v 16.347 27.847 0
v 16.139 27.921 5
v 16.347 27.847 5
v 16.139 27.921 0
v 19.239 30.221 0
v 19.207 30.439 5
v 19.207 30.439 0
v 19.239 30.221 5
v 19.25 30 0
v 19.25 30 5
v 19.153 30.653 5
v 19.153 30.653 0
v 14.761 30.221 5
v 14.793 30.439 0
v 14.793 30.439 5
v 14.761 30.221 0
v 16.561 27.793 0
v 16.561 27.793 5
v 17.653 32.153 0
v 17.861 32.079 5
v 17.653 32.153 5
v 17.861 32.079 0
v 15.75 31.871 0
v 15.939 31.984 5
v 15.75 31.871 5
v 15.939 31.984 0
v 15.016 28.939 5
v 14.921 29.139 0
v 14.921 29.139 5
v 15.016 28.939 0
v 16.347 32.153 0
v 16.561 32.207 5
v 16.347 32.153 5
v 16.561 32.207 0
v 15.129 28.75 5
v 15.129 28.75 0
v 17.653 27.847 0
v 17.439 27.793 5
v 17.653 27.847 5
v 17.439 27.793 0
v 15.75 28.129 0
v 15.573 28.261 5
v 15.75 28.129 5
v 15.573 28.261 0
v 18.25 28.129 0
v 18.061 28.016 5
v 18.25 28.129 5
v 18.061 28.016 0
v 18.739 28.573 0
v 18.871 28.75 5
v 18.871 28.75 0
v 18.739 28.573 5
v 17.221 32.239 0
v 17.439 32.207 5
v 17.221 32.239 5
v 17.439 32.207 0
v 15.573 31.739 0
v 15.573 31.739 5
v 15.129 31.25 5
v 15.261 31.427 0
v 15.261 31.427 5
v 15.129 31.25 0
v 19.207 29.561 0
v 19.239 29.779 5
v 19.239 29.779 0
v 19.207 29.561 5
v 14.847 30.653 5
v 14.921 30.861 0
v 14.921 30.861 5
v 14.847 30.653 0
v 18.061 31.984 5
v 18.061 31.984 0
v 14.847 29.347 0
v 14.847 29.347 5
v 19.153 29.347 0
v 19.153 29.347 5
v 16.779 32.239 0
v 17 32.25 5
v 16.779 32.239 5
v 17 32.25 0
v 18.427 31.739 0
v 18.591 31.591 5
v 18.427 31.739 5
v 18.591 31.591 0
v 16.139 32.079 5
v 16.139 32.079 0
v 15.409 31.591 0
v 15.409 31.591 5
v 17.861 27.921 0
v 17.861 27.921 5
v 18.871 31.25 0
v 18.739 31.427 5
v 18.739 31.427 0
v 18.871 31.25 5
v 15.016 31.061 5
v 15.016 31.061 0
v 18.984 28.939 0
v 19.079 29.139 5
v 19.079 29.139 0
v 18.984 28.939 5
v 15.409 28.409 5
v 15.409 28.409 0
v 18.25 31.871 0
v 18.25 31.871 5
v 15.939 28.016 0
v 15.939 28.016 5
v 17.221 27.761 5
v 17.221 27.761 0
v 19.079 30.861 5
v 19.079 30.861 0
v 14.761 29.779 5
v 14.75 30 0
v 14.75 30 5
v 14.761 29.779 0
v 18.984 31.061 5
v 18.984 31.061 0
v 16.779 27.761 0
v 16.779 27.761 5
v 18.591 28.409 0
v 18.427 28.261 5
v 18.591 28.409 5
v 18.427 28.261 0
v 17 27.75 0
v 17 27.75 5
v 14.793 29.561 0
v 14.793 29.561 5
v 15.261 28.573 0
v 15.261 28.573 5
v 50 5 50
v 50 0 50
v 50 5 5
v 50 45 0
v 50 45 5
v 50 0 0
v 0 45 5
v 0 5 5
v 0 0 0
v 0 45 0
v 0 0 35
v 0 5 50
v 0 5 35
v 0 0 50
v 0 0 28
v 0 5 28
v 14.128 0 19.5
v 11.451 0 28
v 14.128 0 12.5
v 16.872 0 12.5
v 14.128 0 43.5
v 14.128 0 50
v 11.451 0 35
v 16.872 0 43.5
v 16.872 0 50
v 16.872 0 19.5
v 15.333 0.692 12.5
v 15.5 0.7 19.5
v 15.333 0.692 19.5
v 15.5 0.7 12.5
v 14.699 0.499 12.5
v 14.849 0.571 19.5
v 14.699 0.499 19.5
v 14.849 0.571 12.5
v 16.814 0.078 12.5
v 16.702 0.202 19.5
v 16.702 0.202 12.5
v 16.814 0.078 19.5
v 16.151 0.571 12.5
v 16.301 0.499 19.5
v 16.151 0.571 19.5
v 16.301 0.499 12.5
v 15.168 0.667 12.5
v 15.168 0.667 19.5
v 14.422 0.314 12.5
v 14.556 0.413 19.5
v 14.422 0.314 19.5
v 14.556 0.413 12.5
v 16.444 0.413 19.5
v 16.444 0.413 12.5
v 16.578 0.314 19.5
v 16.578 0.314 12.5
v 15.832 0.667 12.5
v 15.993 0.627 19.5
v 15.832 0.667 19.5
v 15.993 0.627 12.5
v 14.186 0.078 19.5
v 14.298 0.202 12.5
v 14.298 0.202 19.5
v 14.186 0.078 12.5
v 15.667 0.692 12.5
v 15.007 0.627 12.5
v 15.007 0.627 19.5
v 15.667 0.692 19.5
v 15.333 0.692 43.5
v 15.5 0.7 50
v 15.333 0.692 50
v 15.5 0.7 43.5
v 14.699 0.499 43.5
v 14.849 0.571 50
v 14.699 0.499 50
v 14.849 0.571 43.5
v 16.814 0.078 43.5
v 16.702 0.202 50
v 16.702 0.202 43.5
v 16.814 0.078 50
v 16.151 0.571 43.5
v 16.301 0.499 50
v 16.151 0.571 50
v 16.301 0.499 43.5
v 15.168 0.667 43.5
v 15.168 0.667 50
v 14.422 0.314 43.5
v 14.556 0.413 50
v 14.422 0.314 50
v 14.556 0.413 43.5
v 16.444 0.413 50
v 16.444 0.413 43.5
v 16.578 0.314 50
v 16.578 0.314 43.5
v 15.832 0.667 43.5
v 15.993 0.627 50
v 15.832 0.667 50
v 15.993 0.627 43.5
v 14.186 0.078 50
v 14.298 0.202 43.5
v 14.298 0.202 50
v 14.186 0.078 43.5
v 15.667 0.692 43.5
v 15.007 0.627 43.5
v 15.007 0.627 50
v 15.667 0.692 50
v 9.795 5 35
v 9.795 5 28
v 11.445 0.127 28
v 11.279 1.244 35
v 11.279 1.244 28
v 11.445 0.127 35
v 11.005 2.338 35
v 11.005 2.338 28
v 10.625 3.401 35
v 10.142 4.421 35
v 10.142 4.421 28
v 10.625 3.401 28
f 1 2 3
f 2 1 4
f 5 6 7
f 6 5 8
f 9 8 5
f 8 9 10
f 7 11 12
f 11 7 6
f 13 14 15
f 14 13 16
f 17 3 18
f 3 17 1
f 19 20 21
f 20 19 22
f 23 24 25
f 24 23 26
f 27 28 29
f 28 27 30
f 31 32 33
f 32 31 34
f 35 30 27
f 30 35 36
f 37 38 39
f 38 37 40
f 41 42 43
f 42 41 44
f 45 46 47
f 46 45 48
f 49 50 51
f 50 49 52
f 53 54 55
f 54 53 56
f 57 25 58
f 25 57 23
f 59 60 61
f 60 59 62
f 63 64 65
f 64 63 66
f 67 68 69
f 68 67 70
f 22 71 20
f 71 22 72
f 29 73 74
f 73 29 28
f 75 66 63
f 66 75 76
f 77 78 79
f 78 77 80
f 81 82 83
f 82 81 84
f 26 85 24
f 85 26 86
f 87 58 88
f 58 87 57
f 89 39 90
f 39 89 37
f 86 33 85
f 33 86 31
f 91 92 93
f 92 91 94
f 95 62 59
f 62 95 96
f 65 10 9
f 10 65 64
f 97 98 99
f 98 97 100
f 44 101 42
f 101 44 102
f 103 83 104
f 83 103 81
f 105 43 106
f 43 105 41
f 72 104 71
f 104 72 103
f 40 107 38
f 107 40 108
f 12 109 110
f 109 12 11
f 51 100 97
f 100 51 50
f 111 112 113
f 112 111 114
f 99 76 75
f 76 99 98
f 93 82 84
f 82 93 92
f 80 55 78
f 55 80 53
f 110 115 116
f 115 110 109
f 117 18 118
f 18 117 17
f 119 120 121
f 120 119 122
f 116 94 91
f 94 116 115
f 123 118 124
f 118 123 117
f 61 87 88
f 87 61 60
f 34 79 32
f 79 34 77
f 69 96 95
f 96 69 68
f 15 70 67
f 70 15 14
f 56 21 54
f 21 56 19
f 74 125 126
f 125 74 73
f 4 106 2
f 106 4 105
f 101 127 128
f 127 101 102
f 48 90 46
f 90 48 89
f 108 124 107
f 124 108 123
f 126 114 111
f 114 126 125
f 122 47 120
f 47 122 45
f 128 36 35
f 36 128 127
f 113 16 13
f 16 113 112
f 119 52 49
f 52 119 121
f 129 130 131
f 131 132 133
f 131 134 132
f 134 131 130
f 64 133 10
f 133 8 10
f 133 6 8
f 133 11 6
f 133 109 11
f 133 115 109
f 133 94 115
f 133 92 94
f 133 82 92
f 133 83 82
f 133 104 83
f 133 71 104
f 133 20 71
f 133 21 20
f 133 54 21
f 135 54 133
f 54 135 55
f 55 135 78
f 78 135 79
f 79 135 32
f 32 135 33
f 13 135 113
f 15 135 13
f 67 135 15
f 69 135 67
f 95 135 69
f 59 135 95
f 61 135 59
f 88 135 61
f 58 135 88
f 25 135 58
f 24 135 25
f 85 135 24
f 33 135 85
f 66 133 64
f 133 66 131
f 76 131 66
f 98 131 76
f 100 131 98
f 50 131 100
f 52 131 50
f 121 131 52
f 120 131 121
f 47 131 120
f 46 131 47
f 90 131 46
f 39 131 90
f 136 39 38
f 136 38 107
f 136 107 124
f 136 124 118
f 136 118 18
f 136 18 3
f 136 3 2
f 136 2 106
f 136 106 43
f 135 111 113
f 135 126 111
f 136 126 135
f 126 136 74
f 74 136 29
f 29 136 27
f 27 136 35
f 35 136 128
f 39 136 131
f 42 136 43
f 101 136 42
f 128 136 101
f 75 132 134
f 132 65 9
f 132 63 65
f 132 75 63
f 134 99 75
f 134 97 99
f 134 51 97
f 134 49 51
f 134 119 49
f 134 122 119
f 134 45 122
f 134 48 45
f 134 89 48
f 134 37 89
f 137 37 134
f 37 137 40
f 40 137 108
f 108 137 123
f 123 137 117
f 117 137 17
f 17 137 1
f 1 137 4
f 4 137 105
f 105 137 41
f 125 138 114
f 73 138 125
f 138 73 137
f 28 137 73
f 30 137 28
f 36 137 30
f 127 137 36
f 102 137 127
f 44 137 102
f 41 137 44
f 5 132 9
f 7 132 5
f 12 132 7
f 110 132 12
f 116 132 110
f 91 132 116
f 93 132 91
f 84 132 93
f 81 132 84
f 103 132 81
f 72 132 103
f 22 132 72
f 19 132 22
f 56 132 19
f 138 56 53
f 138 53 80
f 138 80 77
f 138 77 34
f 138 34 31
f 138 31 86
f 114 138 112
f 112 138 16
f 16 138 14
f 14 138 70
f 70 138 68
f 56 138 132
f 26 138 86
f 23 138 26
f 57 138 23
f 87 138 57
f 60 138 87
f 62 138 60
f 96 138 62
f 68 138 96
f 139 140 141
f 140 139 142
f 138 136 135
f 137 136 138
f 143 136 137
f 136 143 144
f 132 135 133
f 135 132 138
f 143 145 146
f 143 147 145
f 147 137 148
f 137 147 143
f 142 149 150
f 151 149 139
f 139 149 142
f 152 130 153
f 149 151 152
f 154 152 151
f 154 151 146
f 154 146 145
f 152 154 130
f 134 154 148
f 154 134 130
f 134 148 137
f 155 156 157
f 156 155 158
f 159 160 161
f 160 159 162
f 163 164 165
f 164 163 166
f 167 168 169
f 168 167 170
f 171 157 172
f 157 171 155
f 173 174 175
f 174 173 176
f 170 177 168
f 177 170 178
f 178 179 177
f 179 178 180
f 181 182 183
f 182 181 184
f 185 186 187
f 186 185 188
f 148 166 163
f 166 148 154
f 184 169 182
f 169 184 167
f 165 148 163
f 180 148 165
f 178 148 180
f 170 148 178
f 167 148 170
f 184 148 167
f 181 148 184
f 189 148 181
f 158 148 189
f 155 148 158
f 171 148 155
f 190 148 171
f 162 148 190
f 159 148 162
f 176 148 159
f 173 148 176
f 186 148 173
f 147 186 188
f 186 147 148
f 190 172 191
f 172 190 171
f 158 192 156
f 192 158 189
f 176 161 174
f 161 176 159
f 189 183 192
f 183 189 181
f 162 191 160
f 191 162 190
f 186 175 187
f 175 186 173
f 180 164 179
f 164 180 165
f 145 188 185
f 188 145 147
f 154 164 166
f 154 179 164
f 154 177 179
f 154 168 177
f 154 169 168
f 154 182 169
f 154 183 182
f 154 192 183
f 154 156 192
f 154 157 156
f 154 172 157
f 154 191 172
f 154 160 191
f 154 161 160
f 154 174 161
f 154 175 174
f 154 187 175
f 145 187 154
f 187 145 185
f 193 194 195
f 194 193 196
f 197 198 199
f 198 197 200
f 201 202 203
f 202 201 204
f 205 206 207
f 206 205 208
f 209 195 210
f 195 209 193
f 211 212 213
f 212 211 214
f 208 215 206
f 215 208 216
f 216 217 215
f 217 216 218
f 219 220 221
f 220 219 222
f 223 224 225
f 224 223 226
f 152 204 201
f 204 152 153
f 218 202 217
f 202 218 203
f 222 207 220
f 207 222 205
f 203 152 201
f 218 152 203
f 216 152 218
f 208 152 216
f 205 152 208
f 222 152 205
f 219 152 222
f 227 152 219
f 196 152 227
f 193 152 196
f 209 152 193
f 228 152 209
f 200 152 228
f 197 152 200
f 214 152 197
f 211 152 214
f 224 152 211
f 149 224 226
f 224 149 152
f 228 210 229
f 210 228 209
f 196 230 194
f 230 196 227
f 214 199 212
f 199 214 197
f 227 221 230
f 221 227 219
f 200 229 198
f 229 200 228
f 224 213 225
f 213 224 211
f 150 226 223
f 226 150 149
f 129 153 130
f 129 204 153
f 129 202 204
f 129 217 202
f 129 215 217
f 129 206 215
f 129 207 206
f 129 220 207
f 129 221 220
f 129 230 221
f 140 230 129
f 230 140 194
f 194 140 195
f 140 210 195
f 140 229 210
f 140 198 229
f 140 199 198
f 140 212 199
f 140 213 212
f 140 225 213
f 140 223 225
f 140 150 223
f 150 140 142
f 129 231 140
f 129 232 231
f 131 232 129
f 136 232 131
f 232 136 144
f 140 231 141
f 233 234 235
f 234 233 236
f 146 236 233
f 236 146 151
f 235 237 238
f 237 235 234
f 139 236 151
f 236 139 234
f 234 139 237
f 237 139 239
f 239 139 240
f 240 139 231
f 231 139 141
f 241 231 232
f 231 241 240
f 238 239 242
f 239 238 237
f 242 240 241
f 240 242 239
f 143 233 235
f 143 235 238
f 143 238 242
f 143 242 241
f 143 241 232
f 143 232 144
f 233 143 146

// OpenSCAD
// NEMA 17 Stepper Motor Mounting Bracket for Syringe Pump
// Units: mm

// --- Base Plate Dimensions ---
base_x_half = 25;      // Half-width of base plate (x: -25 to 25)
base_y_len = 45;       // Length of base plate (y: 0 to 45)
base_z_thick = 5;      // Thickness of base plate (z: 0 to 5)

// --- Motor Mounting Plate Dimensions ---
motor_plate_x_half = 25; // Width of vertical plate (x: -25 to 25)
motor_plate_y_thick = 5; // Thickness of vertical plate (y: 0 to 5)
motor_plate_z_height = 50; // Height of vertical plate (z: 0 to 50)

// --- Hole Dimensions ---
hole_m4_dia = 4.5;     // Diameter for M4 mounting holes
hole_m3_dia = 3.4;     // Diameter for M3 screw holes
hole_boss_dia = 23;    // Diameter for motor centring boss

// --- Hole Positions ---
// M4 Holes on base plate
m4_hole_x = 17;
m4_hole_y = 30;

// M3 Holes on motor plate (31mm square pattern)
m3_pattern_half = 31 / 2; // 15.5 mm from center

// Boss Hole Center
boss_center_x = 0;
boss_center_z = 28;

// --- Gusset Dimensions ---
gusset_thick = 5;      // Thickness of gusset (along Y)
gusset_leg_y = 20;     // Leg length along +Y
gusset_leg_z = 20;     // Leg length along +Z
// Right angle corner at y=5, z=5.
// Triangle vertices in local coords (y, z): (5,5), (5+20, 5), (5, 5+20) -> (5,5), (25,5), (5,25)

// --- Extrusion Depth for Boolean Operations ---
cut_depth = 1.0;       // Extra depth to ensure clean cuts

// --- Module: Base Plate ---
module base_plate() {
    // Main block
    difference() {
        cube([base_x_half * 2, base_y_len, base_z_thick], center = false);
        
        // M4 Holes
        // Extend hole depth past the bottom (z=0) and top (z=5)
        for (i = [-1, 1]) {
            $fn = 64;
            translate([i * m4_hole_x, m4_hole_y, -cut_depth]) {
                cylinder(d = hole_m4_dia, h = base_z_thick + 2 * cut_depth, center = false);
            }
        }
    }
}

// --- Module: Motor Plate ---
module motor_plate() {
    // Main block
    difference() {
        cube([motor_plate_x_half * 2, motor_plate_y_thick, motor_plate_z_height], center = false);
        
        // Boss Hole (along Y axis)
        // Center at x=0, z=28. Extends through the plate (y: 0 to 5).
        // Extend past faces y=0 and y=5.
        $fn = 64;
        translate([boss_center_x, -cut_depth, boss_center_z]) {
            cylinder(d = hole_boss_dia, h = motor_plate_y_thick + 2 * cut_depth, center = false, axis = [0,1,0]);
        }
        
        // M3 Screw Holes (along Y axis)
        // 31mm square pattern centered on boss hole (x=0, z=28)
        // Holes at x = +/- 15.5, z = 28 +/- 15.5
        for (ix = [-1, 1]) {
            for (iz = [-1, 1]) {
                $fn = 64;
                translate([ix * m3_pattern_half, -cut_depth, boss_center_z + iz * m3_pattern_half]) {
                    cylinder(d = hole_m3_dia, h = motor_plate_y_thick + 2 * cut_depth, center = false, axis = [0,1,0]);
                }
            }
        }
    }
}

// --- Module: Gusset ---
module gusset(side) {
    // Side is -1 for left, 1 for right.
    // Right angle corner at y=5, z=5.
    // Legs: +20 in Y, +20 in Z.
    // Vertices in YZ plane: (5,5), (25,5), (5,25)
    
    // We create a polygon in YZ and extrude it along X.
    // For the left gusset (x: -25 to -20), the X extent is [-25, -20].
    // For the right gusset (x: 20 to 25), the X extent is [20, 25].
    
    x_start = (side == -1) ? -25 : 20;
    x_end = (side == -1) ? -20 : 25;
    
    // Polygon vertices in YZ plane
    // Order matters for linear_extrude if we were using complex shapes, 
    // but for simple extrusion along X, we define the YZ profile.
    // The profile is a triangle: (y=5, z=5), (y=25, z=5), (y=5, z=25)
    polygon(points = [
        [5, 5],
        [25, 5],
        [5, 25]
    ]);
    
    // Extrude along X axis
    linear_extrude(height = x_end - x_start, center = false, convexity = 10) {
        polygon(points = [
            [5, 5],
            [25, 5],
            [5, 25]
        ]);
    }
}

// --- Main Assembly ---
union() {
    // Base Plate
    base_plate();
    
    // Motor Plate (standing on the back edge of the base)
    // Base is z=0..5. Motor plate sits on y=0..5, z=0..50.
    // The motor plate's bottom face (z=0) aligns with the base's bottom face?
    // "standing on the back edge of the base" usually implies the motor plate's 
    // bottom face is at z=0, and its back face is at y=0, aligned with the base's back face.
    // Let's assume the motor plate's bottom is at z=0, same as the base.
    // The motor plate occupies y: 0..5, z: 0..50.
    // The base occupies y: 0..45, z: 0..5.
    // They overlap in y: 0..5, z: 0..5. This is correct for a union.
    motor_plate();
    
    // Left Gusset
    gusset(-1);
    
    // Right Gusset
    gusset(1);
}
